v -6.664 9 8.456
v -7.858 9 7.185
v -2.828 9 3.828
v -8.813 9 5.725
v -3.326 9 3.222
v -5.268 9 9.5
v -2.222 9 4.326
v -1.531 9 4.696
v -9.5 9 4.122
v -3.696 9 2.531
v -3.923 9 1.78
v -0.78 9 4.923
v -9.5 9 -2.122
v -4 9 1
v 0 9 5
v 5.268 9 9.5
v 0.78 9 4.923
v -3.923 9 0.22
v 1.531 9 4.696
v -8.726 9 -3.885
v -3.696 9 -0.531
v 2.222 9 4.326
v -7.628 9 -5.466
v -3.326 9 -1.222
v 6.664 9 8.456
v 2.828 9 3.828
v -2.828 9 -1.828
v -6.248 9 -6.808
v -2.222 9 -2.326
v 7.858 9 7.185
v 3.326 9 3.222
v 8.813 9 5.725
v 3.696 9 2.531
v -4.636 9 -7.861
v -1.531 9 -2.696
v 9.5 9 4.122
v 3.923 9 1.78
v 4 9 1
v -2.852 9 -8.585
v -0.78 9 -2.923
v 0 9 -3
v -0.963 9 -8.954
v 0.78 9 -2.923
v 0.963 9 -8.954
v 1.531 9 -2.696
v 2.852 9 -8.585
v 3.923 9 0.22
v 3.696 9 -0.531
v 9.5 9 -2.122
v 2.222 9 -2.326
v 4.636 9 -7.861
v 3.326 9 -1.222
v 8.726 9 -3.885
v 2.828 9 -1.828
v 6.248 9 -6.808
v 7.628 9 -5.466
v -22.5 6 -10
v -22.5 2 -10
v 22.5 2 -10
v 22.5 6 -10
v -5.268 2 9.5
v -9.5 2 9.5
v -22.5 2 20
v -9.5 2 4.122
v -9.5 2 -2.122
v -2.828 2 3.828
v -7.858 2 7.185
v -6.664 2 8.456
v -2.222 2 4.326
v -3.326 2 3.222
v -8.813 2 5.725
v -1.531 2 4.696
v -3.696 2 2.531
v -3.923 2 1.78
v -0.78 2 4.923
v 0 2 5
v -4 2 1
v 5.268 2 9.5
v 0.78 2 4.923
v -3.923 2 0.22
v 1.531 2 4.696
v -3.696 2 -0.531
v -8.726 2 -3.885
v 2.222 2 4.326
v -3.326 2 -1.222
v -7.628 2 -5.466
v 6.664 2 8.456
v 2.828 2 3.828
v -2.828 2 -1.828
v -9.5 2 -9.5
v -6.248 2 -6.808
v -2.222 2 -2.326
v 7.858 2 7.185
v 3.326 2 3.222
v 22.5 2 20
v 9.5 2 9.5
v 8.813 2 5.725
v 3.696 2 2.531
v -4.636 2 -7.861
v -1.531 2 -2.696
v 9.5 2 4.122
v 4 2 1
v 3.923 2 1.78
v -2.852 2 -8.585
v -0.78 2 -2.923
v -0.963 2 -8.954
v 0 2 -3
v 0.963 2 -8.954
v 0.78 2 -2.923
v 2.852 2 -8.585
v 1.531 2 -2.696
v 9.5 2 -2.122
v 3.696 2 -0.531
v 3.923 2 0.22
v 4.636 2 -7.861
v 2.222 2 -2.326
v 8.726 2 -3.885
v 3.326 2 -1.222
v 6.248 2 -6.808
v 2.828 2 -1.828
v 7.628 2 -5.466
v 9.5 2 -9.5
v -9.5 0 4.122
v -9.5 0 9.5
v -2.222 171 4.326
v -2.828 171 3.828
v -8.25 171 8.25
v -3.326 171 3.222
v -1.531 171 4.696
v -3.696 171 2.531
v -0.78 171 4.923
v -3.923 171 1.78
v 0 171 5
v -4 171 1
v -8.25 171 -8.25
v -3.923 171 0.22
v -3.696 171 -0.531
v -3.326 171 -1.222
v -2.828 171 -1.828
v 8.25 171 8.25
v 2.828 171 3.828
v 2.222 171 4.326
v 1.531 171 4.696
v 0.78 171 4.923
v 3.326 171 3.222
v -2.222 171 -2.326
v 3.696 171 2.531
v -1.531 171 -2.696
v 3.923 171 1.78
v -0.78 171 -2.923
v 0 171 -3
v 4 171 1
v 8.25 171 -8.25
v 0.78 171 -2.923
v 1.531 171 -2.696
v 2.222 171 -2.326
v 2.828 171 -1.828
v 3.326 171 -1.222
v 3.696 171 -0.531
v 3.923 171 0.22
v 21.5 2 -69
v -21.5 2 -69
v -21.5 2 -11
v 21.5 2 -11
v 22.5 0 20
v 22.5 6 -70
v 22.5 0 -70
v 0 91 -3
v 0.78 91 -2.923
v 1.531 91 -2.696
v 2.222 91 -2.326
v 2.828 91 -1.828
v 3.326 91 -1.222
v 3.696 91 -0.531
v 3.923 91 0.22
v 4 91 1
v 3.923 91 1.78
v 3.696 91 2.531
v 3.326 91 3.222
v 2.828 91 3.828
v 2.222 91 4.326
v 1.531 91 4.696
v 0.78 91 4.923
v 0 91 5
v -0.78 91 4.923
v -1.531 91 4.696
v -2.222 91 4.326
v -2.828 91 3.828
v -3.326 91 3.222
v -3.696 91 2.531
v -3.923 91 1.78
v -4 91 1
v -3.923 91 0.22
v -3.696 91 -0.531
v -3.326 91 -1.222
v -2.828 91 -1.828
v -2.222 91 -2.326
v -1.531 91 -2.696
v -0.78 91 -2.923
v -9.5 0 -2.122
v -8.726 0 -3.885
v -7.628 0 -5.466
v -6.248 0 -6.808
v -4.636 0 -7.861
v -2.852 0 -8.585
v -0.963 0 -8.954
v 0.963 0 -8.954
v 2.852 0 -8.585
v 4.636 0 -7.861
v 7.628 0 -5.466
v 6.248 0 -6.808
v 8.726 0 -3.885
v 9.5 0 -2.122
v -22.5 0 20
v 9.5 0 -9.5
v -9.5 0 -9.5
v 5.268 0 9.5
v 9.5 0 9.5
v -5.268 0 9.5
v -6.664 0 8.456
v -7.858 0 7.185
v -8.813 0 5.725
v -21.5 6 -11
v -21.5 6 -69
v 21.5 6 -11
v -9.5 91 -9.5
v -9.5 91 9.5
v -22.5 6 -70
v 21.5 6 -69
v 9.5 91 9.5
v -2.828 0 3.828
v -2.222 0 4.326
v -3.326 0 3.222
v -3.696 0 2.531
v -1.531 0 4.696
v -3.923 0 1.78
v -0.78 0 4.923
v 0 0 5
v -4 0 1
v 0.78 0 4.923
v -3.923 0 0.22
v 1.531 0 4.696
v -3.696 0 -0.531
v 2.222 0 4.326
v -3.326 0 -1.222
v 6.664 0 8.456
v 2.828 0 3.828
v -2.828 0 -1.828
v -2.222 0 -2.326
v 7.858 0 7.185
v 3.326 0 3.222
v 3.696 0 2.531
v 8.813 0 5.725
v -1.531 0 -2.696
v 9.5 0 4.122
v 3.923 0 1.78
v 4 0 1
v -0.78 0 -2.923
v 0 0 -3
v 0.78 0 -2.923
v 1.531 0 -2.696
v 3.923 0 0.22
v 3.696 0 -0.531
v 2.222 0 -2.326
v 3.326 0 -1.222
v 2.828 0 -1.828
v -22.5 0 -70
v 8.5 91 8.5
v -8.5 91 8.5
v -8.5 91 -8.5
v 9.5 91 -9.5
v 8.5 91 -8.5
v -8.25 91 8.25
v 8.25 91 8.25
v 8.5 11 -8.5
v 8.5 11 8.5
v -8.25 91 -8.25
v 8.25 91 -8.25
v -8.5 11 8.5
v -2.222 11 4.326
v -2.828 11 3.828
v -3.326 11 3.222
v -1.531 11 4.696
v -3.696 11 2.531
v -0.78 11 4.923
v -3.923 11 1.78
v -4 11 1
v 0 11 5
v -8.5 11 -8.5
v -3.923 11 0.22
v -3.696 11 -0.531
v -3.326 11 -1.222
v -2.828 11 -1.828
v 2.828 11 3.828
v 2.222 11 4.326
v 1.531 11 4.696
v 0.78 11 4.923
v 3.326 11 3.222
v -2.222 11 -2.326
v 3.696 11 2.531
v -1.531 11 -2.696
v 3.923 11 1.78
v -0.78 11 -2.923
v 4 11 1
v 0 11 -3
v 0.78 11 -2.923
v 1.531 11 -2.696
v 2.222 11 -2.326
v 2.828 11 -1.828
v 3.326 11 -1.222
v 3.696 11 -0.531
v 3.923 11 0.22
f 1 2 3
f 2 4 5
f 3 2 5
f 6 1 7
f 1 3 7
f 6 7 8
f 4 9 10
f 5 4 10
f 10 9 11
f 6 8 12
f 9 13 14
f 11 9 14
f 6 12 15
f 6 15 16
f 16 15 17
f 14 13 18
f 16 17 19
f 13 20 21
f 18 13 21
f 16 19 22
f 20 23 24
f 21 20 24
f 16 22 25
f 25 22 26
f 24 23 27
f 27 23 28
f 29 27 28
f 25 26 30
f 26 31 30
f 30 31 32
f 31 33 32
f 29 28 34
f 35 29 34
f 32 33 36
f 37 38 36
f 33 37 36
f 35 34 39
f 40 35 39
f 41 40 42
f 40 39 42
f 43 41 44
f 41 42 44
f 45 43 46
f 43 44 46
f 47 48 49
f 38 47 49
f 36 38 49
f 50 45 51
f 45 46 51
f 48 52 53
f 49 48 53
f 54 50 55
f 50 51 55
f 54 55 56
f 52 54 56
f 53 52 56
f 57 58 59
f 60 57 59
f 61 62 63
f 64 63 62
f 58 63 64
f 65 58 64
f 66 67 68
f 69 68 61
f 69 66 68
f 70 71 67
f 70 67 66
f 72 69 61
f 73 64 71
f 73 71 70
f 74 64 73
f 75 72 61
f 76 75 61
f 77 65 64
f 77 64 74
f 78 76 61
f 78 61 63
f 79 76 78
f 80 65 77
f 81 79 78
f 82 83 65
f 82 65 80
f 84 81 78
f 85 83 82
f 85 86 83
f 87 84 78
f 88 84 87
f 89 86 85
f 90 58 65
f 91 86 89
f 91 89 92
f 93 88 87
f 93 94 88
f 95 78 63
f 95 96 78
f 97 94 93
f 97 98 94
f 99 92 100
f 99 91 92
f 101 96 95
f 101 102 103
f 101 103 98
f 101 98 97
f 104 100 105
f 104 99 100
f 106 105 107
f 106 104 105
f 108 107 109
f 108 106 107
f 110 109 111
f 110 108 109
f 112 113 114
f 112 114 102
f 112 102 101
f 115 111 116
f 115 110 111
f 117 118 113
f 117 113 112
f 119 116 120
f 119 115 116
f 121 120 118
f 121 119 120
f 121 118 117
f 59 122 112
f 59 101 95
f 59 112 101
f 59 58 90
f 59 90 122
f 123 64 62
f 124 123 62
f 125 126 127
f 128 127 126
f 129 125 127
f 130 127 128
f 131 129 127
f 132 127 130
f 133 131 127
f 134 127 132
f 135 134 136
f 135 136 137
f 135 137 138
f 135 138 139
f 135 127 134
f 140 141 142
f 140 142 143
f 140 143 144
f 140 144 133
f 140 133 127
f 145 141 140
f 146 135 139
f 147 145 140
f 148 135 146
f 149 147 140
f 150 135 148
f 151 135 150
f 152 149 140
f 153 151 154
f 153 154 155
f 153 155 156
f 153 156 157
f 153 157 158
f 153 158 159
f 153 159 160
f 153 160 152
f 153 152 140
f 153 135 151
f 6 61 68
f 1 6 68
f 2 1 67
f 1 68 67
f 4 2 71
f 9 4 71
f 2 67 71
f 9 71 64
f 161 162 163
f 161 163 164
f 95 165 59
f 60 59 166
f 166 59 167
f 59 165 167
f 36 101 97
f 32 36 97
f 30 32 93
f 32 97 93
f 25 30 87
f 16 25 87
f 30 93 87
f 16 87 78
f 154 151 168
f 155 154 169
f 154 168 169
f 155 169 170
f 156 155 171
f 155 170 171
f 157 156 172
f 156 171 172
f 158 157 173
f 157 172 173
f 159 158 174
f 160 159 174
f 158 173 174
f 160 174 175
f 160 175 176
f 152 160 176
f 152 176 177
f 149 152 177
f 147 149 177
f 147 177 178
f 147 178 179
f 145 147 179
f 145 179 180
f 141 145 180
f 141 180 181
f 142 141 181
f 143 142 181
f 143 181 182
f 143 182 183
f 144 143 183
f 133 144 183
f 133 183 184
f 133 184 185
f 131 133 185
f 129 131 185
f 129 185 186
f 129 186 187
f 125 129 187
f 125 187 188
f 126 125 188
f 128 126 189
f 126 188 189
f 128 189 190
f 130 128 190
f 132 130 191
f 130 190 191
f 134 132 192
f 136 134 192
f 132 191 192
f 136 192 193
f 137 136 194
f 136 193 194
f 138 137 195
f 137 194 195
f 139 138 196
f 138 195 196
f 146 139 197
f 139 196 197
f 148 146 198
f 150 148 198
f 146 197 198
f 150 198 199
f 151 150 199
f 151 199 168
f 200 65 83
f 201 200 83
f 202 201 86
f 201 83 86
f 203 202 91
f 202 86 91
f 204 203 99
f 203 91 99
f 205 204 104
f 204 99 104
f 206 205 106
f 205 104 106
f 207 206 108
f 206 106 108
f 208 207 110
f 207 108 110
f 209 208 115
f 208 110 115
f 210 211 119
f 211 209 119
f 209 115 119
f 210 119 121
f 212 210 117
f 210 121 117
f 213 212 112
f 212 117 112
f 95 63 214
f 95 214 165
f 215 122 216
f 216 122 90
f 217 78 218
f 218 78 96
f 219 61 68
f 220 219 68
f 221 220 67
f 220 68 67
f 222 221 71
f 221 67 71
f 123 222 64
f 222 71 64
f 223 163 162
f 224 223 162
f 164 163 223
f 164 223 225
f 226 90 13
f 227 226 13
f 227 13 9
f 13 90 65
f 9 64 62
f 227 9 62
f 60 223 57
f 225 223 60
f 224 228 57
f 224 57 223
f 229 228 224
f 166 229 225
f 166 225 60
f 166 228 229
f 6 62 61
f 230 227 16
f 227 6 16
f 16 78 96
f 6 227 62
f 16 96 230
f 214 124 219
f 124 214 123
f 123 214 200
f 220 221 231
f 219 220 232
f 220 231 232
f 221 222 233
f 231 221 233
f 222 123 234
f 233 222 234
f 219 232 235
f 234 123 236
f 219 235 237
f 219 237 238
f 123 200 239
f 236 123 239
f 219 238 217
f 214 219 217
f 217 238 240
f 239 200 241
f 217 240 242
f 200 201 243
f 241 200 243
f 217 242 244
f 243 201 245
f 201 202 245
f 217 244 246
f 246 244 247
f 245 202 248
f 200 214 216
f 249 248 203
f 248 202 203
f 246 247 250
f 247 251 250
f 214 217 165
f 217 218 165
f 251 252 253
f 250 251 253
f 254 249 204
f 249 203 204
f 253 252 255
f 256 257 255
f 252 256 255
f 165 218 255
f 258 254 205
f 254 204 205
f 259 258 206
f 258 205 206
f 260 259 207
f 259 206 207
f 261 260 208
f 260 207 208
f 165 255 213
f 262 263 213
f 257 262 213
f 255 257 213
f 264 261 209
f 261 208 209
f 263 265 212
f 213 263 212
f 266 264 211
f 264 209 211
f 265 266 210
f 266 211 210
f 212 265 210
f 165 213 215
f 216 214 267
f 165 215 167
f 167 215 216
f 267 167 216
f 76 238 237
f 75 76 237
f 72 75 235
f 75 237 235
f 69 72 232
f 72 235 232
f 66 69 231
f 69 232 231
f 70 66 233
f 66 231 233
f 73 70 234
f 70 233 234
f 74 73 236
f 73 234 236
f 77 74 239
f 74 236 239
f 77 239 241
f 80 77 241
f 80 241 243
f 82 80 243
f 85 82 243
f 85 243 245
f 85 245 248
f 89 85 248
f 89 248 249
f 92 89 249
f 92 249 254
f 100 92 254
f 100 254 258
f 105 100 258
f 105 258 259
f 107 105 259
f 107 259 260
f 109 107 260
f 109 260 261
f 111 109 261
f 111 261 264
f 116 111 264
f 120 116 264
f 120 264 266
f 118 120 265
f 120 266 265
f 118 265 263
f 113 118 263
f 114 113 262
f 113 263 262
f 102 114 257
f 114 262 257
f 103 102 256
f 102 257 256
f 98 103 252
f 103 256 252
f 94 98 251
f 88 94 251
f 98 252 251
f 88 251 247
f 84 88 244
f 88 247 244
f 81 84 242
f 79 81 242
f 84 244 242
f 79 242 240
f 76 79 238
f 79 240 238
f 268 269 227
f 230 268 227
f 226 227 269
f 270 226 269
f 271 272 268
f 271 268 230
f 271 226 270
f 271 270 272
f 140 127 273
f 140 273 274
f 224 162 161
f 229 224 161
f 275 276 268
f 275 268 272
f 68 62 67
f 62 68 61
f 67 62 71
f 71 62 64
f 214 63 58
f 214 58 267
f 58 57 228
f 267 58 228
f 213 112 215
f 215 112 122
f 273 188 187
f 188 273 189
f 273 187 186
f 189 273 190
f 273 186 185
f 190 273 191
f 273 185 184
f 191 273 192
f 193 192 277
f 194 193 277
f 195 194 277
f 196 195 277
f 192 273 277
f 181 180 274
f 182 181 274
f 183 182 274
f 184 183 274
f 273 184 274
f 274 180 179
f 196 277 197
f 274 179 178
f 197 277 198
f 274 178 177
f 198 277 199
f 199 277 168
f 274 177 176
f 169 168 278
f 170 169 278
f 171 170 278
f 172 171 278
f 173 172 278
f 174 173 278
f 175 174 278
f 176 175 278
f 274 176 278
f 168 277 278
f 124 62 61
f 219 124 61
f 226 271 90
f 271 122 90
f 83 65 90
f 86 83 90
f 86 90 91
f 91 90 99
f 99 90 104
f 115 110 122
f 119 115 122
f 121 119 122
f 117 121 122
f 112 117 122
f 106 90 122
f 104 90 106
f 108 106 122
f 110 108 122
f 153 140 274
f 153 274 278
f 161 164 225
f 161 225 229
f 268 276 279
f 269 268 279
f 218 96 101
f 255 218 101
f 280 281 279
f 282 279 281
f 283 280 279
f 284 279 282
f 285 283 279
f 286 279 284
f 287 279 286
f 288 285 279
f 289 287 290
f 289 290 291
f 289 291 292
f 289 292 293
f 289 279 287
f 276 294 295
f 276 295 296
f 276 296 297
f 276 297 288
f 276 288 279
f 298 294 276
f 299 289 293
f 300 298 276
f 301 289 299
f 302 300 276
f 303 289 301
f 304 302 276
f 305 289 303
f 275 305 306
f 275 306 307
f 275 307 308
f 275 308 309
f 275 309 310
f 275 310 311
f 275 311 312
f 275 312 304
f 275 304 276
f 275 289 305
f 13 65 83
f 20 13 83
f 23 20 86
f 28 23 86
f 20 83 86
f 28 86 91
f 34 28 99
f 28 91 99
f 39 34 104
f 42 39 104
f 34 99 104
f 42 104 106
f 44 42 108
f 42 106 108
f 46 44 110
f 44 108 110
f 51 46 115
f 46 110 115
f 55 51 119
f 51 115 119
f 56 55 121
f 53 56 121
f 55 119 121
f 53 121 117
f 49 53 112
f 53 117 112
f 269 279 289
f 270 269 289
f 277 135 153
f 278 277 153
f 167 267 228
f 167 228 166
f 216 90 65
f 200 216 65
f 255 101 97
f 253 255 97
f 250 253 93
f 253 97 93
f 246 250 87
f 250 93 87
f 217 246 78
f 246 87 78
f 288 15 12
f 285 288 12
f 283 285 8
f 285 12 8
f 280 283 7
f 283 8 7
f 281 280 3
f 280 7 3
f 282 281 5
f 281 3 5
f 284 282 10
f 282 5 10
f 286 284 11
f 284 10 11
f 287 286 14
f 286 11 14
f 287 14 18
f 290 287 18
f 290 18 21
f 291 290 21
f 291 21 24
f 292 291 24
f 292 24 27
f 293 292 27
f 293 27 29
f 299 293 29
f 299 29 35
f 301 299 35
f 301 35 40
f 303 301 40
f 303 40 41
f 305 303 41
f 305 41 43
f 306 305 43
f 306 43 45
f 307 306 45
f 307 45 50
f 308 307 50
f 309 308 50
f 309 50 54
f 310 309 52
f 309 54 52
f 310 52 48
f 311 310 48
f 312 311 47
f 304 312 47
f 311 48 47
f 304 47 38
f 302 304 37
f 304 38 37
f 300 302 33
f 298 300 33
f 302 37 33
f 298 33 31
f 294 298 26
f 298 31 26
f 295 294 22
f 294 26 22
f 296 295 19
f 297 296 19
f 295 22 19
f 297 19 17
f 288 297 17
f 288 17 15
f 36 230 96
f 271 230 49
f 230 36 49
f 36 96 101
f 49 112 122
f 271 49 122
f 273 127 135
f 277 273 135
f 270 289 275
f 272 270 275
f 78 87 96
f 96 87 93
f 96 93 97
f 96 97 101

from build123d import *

# Parameters (mm, degrees)
SKETCH1_W             = 20
SKETCH1_H             = 20
SKETCH1_R             = 4
SKETCH1_H_2           = 10
BOSS_EXTRUDE2_DEPTH   = 2
SKETCH2_W             = 45
SKETCH2_H             = 60
SKETCH2_W_2           = 43
SKETCH2_H_2           = 58
BOSS_EXTRUDE3_DEPTH   = 4
SKETCH6_W             = 45
SKETCH6_H             = 30
BOSS_EXTRUDE4_DEPTH   = 2
CUT_EXTRUDE4_DEPTH    = 4
BOSS_EXTRUDE5_DEPTH   = 7
BOSS_EXTRUDE5_2_DEPTH = 7
BOSS_EXTRUDE5_3_DEPTH = 7
SKETCH11_W            = 19
SKETCH11_H            = 19
BOSS_EXTRUDE6_DEPTH   = 2
SKETCH14_R            = 4
CUT_EXTRUDE7_DEPTH    = 19
SKETCH15_W            = 1
SKETCH15_H            = 17
SKETCH15_H_2          = 1
BOSS_EXTRUDE7_DEPTH   = 80
SKETCH16_W            = 16.5
SKETCH16_H            = 16.5
BOSS_EXTRUDE8_DEPTH   = 80
SKETCH17_R            = 4
CUT_EXTRUDE8_DEPTH    = 193


with BuildPart() as part:
    # Sketch1 → Boss-Extrude2 (new body)
    # profile 1 of 6: a face of its own
    with BuildSketch(Plane(origin=(0, 0, 0), x_dir=(1, 0, 0), z_dir=(0, 1, 0))):
        Polygon((-22.5, 10), (-10, 10), (10, 10), (22.5, 10), (22.5, 70), (-22.5, 70), align=None)
    # profile 2 of 6: a face of its own
    with BuildSketch(Plane(origin=(0, 0, 0), x_dir=(1, 0, 0), z_dir=(0, 1, 0))):
        Polygon((-22.5, 10), (-10, -10), (-10, 10), align=None)
    # profile 3 of 6: a face of its own
    with BuildSketch(Plane(origin=(0, 0, 0), x_dir=(1, 0, 0), z_dir=(0, 1, 0))):
        Polygon((10, 10), (10, -10), (22.5, 10), align=None)
    # profile 4 of 6: a face of its own
    with BuildSketch(Plane(origin=(0, 0, 0), x_dir=(1, 0, 0), z_dir=(0, 1, 0))):
        Rectangle(SKETCH1_W, SKETCH1_H)
        Circle(SKETCH1_R, mode=Mode.SUBTRACT)
    # profile 5 of 6: a face of its own
    with BuildSketch(Plane(origin=(0, 0, 0), x_dir=(1, 0, 0), z_dir=(0, 1, 0))):
        Circle(SKETCH1_R)
    # profile 6 of 6: a face of its own
    with BuildSketch(Plane(origin=(0, 0, 0), x_dir=(1, 0, 0), z_dir=(0, 1, 0))):
        with Locations((0, -15)):
            Rectangle(SKETCH1_W, SKETCH1_H_2)
    extrude(amount=BOSS_EXTRUDE2_DEPTH)

    # Sketch2 → Boss-Extrude3 (add)
    with BuildSketch(Plane(origin=(0, 2, 0), x_dir=(1, 0, 0), z_dir=(0, 1, 0))):
        with Locations((0, 40)):
            Rectangle(SKETCH2_W, SKETCH2_H)
        with Locations((0, 40)):
            Rectangle(SKETCH2_W_2, SKETCH2_H_2, mode=Mode.SUBTRACT)
    extrude(amount=BOSS_EXTRUDE3_DEPTH)

    # Sketch6 → Boss-Extrude4 (add)
    with BuildSketch(Plane(origin=(0, 2, 0), x_dir=(1, 0, 0), z_dir=(0, 1, 0))):
        with Locations((0, -5)):
            Rectangle(SKETCH6_W, SKETCH6_H)
    extrude(amount=-BOSS_EXTRUDE4_DEPTH)

    # Sketch7 → Cut-Extrude4 (cut)
    with BuildSketch(Plane(origin=(0, 2, 0), x_dir=(1, 0, 0), z_dir=(0, 1, 0))):
        with BuildLine():
            Line((9.5, 9.5), (-9.5, 9.5))
            Line((-9.5, 9.5), (-9.5, 2.122498999))
            ThreePointArc((-9.5, 2.122498999), (0, 9), (9.5, 2.122498999))
            Line((9.5, 2.122498999), (9.5, 9.5))
        make_face()
        with BuildLine():
            ThreePointArc((-5.267826876, -9.5), (-7.858215886, -7.184532568), (-9.5, -4.122498999))
            Line((-9.5, -4.122498999), (-9.5, -9.5))
            Line((-9.5, -9.5), (-5.267826876, -9.5))
        make_face()
        with BuildLine():
            Line((9.5, -9.5), (9.5, -4.122498999))
            ThreePointArc((9.5, -4.122498999), (7.858215886, -7.184532568), (5.267826876, -9.5))
            Line((5.267826876, -9.5), (9.5, -9.5))
        make_face()
    extrude(amount=-CUT_EXTRUDE4_DEPTH, mode=Mode.SUBTRACT)


with BuildPart() as body_2:
    # Sketch8 → Boss-Extrude5 (new body)
    with BuildSketch(Plane(origin=(0, 2, 0), x_dir=(1, 0, 0), z_dir=(0, 1, 0))):
        with BuildLine():
            Line((9.5, 2.122498999), (9.5, 9.5))
            Line((9.5, 9.5), (-9.5, 9.5))
            Line((-9.5, 9.5), (-9.5, 2.122498999))
            ThreePointArc((-9.5, 2.122498999), (0, 9), (9.5, 2.122498999))
        make_face()
    extrude(amount=BOSS_EXTRUDE5_DEPTH)



with BuildPart() as body_3:
    # Sketch8 → Boss-Extrude5 2 (new body)
    with BuildSketch(Plane(origin=(0, 2, 0), x_dir=(1, 0, 0), z_dir=(0, 1, 0))):
        with BuildLine():
            Line((-9.5, -9.5), (-5.267826876, -9.5))
            ThreePointArc((-5.267826876, -9.5), (-7.858215886, -7.184532568), (-9.5, -4.122498999))
            Line((-9.5, -4.122498999), (-9.5, -9.5))
        make_face()
    extrude(amount=BOSS_EXTRUDE5_2_DEPTH)


with BuildPart() as body_4:
    # Sketch8 → Boss-Extrude5 3 (new body)
    with BuildSketch(Plane(origin=(0, 2, 0), x_dir=(1, 0, 0), z_dir=(0, 1, 0))):
        with BuildLine():
            Line((9.5, -9.5), (9.5, -4.122498999))
            ThreePointArc((9.5, -4.122498999), (7.858215886, -7.184532568), (5.267826876, -9.5))
            Line((5.267826876, -9.5), (9.5, -9.5))
        make_face()
    extrude(amount=BOSS_EXTRUDE5_3_DEPTH)


with BuildPart() as body_2_1:
    add(body_2.part)

    add(body_3.part)  # Boss-Extrude6 merges body 3

    add(body_4.part)  # Boss-Extrude6 merges body 4
    # Sketch11 → Boss-Extrude6 (add)
    with BuildSketch(Plane(origin=(0, 9, 0), x_dir=(1, 0, 0), z_dir=(0, 1, 0))):
        Rectangle(SKETCH11_W, SKETCH11_H)
    extrude(amount=BOSS_EXTRUDE6_DEPTH)


with BuildPart() as cut_extrude7_tool:
    # Sketch14 → Cut-Extrude7 (new body)
    with BuildSketch(Plane.XZ):
        with Locations(Location((0, 1, 0), (0, 0, 90))):
            Circle(SKETCH14_R)
    extrude(amount=-CUT_EXTRUDE7_DEPTH)


with BuildPart() as part_1:
    add(part.part)

    # Cut-Extrude7: cut by cut_extrude7_tool
    add(cut_extrude7_tool.part, mode=Mode.SUBTRACT)


with BuildPart() as body_2_2:
    add(body_2_1.part)

    # Cut-Extrude7: cut by cut_extrude7_tool
    add(cut_extrude7_tool.part, mode=Mode.SUBTRACT)

    # Sketch15 → Boss-Extrude7 (add)
    with BuildSketch(Plane(origin=(0, 11, 0), x_dir=(1, 0, 0), z_dir=(0, 1, 0))):
        Polygon((-8.5, 8.5), (8.5, 8.5), (8.5, 9.5), (-9.5, 9.5), (-9.5, -9.5), (8.5, -9.5), (8.5, -8.5), (-8.5, -8.5), align=None)
        with Locations((9, 0)):
            Rectangle(SKETCH15_W, SKETCH15_H)
        with Locations((9, 9)):
            Rectangle(SKETCH15_W, SKETCH15_H_2)
        with Locations((9, -9)):
            Rectangle(SKETCH15_W, SKETCH15_H_2)
    extrude(amount=BOSS_EXTRUDE7_DEPTH)


with BuildPart() as body_3_2:
    # Sketch16 → Boss-Extrude8 (new body)
    with BuildSketch(Plane(origin=(0, 91, 0), x_dir=(1, 0, 0), z_dir=(0, 1, 0))):
        Rectangle(SKETCH16_W, SKETCH16_H)
    extrude(amount=BOSS_EXTRUDE8_DEPTH)

    # Sketch17 → Cut-Extrude8 (cut)
    with BuildSketch(Plane.XZ):
        with Locations(Location((0, 1, 0), (0, 0, 270))):
            Circle(SKETCH17_R)
    extrude(amount=-CUT_EXTRUDE8_DEPTH, mode=Mode.SUBTRACT)


solid = Compound([part_1.part, body_2_2.part, body_3_2.part])
